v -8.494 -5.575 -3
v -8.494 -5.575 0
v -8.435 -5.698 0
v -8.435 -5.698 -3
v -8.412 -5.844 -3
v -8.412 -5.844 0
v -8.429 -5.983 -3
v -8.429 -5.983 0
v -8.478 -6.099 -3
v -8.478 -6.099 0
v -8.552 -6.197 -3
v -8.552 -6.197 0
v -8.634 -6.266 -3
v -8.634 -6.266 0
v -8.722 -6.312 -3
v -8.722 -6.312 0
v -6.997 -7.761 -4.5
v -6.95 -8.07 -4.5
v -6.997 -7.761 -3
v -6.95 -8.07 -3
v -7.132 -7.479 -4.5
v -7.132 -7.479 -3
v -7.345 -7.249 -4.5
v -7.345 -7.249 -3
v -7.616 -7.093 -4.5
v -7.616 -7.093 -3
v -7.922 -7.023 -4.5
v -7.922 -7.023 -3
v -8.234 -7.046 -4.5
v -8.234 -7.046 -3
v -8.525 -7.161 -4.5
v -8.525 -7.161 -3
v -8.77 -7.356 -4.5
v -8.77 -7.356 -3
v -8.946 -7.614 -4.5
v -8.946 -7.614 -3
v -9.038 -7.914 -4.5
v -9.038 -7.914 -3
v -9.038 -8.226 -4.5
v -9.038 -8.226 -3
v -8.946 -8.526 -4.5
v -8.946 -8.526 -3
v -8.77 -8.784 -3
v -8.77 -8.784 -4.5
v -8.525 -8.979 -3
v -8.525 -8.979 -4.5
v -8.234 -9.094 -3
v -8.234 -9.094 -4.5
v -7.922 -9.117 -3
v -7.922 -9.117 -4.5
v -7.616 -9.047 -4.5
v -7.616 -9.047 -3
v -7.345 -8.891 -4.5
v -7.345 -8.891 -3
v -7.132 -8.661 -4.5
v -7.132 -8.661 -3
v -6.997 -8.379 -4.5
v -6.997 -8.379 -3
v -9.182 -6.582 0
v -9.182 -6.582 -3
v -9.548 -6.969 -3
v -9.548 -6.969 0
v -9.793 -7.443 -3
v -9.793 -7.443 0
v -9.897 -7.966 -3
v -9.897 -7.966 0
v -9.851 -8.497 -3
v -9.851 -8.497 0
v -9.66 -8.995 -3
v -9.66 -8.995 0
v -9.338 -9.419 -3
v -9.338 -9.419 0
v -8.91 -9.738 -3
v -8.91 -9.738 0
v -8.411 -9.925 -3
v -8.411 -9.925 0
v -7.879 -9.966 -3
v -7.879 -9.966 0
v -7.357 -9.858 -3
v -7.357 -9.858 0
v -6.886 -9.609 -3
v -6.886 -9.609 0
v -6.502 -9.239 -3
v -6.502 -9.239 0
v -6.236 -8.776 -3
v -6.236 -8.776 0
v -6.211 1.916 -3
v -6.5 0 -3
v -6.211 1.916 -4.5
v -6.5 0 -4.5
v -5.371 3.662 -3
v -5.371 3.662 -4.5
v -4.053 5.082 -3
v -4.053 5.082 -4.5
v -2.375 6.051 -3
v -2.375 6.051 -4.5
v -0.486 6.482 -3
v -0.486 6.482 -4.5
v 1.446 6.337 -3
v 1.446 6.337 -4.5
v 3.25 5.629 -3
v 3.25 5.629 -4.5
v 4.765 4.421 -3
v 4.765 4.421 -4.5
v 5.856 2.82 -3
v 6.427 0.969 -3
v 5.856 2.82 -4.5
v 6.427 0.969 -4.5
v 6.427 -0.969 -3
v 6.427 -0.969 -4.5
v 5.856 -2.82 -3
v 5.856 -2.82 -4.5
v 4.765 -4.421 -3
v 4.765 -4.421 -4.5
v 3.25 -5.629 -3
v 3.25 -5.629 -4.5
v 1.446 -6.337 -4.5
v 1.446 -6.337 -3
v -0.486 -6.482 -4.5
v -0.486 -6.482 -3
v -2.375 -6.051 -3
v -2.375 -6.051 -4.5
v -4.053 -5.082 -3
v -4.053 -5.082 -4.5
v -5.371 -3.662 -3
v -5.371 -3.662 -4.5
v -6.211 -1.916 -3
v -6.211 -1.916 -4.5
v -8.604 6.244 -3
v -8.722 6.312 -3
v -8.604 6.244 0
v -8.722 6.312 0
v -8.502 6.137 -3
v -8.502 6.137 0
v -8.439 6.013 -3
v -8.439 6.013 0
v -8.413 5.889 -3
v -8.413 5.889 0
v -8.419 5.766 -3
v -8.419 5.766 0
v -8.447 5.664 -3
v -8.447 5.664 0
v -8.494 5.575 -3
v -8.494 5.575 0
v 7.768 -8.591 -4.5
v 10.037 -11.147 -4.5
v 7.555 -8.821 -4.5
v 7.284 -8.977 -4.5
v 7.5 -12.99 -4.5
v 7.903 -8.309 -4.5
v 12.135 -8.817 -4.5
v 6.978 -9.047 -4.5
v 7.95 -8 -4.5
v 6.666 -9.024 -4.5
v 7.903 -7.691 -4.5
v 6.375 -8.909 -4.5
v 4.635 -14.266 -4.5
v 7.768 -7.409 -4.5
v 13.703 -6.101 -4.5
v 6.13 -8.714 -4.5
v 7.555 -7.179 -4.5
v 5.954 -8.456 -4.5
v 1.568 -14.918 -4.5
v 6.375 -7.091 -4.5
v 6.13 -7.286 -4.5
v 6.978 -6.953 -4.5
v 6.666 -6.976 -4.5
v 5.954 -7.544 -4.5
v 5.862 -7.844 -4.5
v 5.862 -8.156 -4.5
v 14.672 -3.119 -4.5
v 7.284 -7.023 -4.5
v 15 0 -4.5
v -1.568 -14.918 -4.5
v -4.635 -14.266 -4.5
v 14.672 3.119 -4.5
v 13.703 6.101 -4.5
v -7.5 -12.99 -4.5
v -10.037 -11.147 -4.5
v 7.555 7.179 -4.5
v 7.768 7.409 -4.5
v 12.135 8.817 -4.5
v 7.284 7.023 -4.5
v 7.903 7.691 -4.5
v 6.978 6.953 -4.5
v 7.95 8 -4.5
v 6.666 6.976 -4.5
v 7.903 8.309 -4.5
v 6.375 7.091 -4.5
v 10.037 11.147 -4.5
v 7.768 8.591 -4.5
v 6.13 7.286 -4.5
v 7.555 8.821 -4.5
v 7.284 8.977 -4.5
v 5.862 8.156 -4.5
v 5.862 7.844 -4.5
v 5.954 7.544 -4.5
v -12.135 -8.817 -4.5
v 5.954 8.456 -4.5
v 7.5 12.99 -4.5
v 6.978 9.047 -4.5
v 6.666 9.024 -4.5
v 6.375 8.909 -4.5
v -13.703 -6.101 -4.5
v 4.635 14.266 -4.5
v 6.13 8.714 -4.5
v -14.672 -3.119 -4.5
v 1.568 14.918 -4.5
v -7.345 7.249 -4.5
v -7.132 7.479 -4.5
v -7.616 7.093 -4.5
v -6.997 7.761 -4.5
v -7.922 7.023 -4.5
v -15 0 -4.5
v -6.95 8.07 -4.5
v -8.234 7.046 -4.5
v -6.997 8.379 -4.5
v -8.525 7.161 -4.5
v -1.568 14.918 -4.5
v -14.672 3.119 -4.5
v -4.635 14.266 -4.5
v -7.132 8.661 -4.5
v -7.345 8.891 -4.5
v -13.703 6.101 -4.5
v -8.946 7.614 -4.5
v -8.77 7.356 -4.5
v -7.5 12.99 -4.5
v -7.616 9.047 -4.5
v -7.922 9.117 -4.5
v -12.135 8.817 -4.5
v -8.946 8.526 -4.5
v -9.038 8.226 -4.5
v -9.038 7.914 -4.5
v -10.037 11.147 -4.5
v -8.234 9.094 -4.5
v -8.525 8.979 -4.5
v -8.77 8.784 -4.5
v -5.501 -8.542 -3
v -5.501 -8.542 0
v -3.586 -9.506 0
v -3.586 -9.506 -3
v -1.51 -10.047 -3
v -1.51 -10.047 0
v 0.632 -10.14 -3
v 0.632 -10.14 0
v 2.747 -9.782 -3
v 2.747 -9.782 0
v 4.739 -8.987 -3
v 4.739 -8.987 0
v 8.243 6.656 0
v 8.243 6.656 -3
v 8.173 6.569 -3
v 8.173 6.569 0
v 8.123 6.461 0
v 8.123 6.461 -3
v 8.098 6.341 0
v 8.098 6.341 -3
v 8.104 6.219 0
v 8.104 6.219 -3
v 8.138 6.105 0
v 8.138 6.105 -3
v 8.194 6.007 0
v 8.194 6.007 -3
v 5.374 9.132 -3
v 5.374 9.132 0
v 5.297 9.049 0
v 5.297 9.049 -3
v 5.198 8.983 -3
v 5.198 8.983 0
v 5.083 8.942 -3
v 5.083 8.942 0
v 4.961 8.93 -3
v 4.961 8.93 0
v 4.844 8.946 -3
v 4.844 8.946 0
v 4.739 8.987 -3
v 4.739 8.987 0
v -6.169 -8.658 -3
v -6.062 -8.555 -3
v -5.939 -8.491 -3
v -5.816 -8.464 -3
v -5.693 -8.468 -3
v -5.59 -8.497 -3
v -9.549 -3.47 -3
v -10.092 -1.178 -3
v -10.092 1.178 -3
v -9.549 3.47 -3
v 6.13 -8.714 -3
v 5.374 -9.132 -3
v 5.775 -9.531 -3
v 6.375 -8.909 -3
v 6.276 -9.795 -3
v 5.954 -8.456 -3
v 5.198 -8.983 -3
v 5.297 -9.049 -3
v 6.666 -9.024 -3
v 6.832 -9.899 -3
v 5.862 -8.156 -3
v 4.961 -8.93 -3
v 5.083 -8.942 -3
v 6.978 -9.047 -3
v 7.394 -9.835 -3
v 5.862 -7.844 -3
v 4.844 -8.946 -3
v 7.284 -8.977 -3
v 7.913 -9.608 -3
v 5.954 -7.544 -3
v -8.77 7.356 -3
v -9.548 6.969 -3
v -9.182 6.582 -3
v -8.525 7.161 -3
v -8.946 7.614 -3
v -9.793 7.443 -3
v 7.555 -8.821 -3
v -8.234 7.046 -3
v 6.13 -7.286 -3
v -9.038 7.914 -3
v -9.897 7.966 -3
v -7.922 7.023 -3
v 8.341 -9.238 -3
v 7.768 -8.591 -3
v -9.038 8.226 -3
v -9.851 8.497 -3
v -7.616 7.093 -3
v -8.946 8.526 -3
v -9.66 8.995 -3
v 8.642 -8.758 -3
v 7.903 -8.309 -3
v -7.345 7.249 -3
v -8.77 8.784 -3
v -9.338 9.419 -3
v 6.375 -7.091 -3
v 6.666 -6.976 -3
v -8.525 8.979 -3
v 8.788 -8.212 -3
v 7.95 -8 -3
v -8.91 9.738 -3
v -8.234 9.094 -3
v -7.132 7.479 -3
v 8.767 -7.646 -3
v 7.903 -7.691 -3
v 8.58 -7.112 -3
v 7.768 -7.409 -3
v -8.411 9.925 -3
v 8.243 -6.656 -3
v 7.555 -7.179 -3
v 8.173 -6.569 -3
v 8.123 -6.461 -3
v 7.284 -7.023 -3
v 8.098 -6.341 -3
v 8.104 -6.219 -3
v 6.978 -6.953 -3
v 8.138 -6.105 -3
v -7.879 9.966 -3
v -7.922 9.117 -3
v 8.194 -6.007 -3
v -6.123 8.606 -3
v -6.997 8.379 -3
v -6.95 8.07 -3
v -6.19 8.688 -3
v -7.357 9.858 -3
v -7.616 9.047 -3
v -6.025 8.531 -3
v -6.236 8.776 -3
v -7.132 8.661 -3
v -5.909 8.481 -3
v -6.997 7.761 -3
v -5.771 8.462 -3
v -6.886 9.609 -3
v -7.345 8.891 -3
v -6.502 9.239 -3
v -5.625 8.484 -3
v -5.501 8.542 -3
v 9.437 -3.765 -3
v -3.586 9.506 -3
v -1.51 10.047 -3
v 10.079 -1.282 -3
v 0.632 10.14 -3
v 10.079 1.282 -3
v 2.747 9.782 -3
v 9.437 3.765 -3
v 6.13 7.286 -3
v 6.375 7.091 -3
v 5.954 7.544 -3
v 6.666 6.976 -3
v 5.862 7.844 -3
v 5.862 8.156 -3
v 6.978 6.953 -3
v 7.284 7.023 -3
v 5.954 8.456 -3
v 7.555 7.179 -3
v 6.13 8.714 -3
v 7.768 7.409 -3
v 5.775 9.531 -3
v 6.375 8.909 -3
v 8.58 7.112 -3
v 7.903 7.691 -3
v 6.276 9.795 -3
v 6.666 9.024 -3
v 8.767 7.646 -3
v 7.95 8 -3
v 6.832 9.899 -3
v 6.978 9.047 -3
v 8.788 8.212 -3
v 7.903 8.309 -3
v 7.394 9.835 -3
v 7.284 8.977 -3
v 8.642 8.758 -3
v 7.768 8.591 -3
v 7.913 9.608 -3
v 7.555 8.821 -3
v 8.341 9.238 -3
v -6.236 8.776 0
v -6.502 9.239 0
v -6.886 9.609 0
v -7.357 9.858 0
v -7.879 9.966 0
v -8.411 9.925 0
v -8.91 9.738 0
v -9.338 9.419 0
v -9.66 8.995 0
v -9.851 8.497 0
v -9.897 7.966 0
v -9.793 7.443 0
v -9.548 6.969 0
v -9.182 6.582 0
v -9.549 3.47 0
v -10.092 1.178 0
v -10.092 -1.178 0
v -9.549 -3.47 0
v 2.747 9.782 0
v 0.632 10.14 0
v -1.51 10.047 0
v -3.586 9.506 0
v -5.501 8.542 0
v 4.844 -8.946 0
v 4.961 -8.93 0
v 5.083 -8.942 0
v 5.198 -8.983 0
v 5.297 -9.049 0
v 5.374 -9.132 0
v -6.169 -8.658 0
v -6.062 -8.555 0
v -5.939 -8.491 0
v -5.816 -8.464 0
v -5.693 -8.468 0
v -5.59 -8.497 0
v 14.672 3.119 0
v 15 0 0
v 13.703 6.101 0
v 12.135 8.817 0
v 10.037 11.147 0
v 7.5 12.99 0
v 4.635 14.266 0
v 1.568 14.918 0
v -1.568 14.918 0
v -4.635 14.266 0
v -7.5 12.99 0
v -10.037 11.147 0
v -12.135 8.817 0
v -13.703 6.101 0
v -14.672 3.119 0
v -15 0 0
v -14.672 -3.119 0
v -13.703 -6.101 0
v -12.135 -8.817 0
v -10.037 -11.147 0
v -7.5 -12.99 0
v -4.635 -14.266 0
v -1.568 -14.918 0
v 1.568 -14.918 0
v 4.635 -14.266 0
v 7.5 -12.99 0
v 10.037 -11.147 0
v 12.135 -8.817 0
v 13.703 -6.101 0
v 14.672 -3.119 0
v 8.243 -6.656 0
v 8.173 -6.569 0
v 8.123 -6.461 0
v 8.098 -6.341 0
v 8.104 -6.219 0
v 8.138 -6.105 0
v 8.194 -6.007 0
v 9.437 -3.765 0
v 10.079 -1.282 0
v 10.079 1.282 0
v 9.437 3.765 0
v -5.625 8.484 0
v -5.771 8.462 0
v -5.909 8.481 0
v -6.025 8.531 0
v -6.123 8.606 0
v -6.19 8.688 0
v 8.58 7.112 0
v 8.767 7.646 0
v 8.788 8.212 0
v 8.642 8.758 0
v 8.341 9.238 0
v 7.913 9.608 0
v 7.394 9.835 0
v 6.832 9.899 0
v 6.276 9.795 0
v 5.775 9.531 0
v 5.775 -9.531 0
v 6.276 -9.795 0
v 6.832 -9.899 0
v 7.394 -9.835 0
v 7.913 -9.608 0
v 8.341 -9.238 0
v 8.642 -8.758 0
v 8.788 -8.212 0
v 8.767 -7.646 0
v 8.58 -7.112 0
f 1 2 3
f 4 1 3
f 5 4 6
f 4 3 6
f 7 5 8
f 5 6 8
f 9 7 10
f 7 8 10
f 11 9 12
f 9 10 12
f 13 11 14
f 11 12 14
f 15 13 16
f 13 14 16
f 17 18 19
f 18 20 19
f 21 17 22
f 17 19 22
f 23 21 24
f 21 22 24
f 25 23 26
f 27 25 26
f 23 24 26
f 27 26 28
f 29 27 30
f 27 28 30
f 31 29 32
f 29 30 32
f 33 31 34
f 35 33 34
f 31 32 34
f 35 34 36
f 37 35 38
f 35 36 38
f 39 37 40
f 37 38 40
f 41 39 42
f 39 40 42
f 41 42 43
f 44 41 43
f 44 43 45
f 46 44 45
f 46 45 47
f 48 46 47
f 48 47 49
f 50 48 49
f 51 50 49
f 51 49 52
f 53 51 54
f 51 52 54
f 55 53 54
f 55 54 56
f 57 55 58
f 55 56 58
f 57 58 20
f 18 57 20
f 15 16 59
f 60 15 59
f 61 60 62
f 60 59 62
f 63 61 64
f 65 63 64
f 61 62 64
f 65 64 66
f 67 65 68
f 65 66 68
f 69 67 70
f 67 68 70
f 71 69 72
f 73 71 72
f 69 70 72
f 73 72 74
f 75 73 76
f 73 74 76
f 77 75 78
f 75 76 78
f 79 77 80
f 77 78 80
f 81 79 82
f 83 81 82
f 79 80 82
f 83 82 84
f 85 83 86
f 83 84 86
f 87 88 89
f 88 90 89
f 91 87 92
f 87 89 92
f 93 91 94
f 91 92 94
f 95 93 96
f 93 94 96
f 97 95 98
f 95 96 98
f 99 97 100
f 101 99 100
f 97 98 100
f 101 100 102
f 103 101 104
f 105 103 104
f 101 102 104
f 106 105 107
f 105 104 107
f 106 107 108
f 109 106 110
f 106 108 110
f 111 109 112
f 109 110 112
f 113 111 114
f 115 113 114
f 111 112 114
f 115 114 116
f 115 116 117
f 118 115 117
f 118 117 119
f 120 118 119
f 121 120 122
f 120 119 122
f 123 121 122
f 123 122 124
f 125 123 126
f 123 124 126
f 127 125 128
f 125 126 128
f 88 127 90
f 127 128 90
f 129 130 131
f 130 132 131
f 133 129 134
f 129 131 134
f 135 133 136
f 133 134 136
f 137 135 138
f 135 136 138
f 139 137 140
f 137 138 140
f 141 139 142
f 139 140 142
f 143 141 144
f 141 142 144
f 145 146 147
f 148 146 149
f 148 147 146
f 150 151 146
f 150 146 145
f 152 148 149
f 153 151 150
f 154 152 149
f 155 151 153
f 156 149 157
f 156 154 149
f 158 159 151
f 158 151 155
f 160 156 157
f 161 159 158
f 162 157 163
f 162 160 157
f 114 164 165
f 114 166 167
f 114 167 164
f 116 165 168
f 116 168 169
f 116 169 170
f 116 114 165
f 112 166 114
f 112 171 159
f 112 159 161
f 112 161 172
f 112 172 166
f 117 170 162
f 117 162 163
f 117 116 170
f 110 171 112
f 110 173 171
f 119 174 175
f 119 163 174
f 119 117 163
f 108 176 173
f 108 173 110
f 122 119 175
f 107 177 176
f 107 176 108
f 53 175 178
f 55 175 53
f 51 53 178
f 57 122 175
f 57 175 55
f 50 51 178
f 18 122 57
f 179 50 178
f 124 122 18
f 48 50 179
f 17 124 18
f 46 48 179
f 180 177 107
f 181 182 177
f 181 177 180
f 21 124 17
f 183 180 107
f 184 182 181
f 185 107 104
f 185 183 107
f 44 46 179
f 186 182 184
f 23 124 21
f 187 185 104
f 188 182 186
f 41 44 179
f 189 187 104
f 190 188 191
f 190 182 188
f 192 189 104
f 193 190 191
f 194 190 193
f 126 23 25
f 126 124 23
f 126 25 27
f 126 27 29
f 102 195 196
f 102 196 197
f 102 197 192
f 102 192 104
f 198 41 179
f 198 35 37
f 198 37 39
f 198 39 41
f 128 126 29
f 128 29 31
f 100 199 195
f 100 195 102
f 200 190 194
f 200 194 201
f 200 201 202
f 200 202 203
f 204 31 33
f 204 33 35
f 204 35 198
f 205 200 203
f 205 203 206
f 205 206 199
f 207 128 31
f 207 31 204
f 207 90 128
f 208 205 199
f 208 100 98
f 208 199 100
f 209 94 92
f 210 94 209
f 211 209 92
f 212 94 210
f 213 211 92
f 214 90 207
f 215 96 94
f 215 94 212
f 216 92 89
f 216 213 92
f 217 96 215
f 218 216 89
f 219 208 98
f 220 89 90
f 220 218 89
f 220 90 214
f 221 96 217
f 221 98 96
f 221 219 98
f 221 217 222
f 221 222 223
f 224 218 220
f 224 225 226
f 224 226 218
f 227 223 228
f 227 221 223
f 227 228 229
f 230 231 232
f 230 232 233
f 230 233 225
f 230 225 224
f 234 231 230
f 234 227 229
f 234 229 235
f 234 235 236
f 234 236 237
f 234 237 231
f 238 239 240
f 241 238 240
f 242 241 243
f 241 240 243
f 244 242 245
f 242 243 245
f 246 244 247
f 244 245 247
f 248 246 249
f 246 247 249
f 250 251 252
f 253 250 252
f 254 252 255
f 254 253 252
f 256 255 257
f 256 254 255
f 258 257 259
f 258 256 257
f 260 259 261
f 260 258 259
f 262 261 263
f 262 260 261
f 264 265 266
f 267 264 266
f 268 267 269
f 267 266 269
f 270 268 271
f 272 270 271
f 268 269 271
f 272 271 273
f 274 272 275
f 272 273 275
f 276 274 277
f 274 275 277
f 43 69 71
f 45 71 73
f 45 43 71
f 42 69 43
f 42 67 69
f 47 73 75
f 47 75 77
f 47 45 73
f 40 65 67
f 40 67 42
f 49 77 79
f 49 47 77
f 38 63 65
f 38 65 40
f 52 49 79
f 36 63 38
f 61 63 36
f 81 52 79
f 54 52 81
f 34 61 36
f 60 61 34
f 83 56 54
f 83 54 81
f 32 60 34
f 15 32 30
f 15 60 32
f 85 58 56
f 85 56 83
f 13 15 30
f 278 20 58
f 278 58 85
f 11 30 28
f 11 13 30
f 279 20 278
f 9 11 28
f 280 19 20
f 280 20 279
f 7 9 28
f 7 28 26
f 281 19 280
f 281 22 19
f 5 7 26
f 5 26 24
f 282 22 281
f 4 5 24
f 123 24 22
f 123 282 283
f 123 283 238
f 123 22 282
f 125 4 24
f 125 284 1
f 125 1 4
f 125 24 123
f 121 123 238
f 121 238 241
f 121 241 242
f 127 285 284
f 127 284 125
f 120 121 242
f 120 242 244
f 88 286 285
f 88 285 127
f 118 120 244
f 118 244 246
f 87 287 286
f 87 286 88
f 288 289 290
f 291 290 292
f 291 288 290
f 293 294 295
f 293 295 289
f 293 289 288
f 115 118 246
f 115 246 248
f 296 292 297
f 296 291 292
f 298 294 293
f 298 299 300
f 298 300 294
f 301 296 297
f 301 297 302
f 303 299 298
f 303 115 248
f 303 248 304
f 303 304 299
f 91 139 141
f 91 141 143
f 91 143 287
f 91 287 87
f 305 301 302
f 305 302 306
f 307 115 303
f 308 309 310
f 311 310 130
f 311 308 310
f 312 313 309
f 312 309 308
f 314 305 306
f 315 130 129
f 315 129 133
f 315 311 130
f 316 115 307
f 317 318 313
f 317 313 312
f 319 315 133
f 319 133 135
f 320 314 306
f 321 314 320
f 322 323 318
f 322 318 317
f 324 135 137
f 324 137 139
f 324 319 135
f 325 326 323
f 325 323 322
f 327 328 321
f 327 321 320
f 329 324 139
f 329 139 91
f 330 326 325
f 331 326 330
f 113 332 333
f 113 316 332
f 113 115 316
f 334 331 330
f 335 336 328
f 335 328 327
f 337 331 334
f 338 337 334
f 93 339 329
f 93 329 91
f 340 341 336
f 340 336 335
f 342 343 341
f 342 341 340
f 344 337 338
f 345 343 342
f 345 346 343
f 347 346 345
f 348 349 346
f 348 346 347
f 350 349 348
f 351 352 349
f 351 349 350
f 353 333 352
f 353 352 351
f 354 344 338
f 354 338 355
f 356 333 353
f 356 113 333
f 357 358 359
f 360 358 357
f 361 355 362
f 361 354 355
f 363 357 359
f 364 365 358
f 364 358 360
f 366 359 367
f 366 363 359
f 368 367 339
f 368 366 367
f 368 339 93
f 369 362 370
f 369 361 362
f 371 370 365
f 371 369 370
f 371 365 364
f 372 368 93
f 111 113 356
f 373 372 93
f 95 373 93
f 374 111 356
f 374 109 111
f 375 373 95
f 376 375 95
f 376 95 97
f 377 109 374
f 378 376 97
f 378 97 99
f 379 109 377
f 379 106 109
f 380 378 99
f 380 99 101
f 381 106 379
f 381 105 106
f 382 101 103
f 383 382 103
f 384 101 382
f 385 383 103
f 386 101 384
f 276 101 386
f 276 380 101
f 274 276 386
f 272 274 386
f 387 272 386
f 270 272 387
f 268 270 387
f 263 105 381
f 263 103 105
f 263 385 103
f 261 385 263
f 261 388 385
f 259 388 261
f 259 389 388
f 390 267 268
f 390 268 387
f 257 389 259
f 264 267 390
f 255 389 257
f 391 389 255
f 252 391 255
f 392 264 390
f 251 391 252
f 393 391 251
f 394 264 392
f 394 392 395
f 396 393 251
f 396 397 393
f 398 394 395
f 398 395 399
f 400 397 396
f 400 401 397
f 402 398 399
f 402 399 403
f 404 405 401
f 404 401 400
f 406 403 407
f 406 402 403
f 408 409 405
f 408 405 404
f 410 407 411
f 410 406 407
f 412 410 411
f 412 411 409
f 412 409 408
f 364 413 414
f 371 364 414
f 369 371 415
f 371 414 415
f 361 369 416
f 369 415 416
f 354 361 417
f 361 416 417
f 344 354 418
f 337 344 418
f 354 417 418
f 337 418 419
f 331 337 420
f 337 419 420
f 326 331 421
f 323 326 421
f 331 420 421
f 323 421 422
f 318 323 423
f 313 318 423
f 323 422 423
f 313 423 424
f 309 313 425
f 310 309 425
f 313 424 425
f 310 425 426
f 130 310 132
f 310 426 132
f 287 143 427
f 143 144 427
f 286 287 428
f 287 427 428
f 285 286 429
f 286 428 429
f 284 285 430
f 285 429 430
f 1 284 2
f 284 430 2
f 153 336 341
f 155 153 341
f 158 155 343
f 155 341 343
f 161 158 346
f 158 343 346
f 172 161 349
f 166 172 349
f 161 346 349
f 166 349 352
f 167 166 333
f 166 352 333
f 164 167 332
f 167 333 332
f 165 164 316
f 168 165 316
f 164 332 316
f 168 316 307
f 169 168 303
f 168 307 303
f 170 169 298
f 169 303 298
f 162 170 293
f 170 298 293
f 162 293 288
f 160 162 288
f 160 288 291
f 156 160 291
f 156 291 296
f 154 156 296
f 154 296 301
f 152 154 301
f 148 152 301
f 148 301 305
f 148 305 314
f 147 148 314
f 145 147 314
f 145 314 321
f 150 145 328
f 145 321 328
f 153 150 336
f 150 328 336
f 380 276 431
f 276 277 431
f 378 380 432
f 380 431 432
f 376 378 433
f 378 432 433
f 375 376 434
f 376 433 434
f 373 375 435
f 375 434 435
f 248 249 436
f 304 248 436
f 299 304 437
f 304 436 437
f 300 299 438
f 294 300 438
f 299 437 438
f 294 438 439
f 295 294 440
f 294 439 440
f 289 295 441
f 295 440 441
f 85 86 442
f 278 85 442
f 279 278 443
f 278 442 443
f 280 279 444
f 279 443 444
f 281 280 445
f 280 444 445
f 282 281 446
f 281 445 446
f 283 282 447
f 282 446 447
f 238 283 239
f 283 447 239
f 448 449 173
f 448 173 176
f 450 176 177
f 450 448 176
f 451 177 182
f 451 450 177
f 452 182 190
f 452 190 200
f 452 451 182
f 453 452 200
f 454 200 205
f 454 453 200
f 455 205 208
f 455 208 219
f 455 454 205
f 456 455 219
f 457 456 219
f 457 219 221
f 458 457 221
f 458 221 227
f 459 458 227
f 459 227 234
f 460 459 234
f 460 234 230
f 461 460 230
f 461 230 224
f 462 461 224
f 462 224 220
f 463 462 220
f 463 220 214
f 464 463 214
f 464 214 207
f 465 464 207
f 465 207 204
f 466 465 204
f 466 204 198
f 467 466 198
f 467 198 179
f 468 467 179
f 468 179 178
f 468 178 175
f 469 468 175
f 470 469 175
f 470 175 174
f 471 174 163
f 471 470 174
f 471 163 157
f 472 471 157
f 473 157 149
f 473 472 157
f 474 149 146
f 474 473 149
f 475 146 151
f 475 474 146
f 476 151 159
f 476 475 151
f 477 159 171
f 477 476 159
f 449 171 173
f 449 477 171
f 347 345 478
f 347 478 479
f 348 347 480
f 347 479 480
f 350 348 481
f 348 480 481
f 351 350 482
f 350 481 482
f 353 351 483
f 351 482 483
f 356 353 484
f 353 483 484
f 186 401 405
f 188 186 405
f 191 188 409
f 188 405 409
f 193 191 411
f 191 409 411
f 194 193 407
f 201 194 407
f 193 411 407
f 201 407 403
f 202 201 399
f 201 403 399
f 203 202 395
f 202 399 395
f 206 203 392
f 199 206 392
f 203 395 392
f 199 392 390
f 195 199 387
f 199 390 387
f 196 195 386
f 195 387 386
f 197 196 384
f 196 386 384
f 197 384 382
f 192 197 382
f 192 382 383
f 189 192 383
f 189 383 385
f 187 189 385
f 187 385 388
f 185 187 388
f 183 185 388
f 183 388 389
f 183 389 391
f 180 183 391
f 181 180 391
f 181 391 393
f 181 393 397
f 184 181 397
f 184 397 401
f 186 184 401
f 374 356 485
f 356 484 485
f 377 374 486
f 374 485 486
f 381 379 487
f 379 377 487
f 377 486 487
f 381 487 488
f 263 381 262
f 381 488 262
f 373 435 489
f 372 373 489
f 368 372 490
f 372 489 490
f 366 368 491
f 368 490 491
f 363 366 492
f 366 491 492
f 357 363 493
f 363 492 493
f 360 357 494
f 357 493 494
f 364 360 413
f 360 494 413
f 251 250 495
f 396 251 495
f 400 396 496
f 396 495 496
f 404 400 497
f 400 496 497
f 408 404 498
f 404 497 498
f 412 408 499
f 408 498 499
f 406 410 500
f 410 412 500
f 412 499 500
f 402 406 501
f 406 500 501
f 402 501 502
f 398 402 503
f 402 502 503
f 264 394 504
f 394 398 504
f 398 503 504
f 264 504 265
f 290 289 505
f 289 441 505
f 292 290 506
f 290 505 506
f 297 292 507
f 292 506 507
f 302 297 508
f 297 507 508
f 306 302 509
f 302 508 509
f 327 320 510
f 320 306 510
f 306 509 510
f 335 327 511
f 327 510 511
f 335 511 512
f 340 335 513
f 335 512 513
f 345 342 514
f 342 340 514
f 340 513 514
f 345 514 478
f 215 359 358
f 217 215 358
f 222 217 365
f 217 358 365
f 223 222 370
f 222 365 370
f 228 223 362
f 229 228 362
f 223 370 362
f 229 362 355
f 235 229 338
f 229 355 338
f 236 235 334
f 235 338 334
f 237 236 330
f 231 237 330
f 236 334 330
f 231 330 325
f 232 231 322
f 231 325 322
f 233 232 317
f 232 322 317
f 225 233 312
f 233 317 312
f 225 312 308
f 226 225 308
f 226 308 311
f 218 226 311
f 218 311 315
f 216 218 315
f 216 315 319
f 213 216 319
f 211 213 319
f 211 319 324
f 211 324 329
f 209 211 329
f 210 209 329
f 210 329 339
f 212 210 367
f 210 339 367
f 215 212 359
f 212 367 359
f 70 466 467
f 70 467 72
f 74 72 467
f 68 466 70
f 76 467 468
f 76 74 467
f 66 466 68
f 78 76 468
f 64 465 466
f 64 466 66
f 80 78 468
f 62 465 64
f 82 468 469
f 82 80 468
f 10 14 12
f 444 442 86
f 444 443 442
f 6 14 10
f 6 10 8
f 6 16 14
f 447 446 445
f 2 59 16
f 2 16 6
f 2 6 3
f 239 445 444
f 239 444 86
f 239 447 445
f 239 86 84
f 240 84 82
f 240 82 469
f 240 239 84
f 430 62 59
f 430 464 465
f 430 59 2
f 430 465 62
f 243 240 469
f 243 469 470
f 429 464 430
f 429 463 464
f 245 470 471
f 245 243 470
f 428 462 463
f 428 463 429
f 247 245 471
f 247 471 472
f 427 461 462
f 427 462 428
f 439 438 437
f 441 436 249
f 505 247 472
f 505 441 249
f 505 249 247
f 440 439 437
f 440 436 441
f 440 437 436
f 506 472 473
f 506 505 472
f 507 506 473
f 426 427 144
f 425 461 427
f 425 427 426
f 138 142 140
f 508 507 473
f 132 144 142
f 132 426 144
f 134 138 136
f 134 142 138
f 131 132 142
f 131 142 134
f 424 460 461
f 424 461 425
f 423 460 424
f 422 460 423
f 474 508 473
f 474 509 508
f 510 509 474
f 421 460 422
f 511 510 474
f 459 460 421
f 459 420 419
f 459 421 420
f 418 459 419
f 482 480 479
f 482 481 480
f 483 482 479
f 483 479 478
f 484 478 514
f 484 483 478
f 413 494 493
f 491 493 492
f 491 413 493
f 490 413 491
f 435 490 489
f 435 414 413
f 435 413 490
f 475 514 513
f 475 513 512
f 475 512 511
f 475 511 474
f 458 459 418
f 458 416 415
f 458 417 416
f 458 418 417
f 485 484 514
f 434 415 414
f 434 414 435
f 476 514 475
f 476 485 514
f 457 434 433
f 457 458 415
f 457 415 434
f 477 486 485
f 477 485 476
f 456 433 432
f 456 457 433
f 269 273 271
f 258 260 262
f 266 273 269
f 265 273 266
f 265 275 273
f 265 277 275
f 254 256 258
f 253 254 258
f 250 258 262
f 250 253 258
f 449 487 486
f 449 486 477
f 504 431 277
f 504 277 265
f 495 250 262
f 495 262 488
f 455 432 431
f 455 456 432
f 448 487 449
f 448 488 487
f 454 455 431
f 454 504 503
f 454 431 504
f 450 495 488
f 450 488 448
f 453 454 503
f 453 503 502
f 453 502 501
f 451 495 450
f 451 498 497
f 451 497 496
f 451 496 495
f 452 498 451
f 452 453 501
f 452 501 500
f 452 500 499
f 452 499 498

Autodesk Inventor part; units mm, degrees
ref_plane "YZ Plane" through (0, 0, 0) normal (1, 0, 0) x (0, 1, 0)
ref_plane "XZ Plane" through (0, 0, 0) normal (0, 1, 0) x (-1, 0, 0)
ref_plane "XY Plane" through (0, 0, 0) normal (0, 0, 1) x (1, 0, 0)
sketch "Sketch8" plane through (0, 0, 0) normal (0, 0, 1) x (1, 0, 0)
  circle A0 centre (0, 0) radius 15
  dimension "d33" = 30
extrude "Extrusion7" add sketch "Sketch8" against normal blind 8
sketch "Sketch10" plane through (0, 0, -8) normal (0, 0, -1) x (-1, 0, 0)
  line L0 (9, 10.07) -> (-29.1, 10.07)
  arc A0 (10, 9.07) -> (9, 10.07) centre (9, 9.07) ccw
  line L1 (10, 9.07) -> (10, -9.07)
  arc A1 (9, -10.07) -> (10, -9.07) centre (9, -9.07) ccw
  line L2 (-29.1, -10.07) -> (9, -10.07)
  line L3 (-29.1, 10.07) -> (-29.1, -10.07)
  line L4 (10.4, -9.07) -> (10.4, 9.07)
  arc A2 (10.4, 9.07) -> (9, 10.47) centre (9, 9.07) ccw
  line L5 (9, 10.47) -> (-29.5, 10.47)
  line L6 (-29.5, 10.47) -> (-29.5, -10.47)
  line L7 (-29.5, -10.47) -> (9, -10.47)
  arc A3 (9, -10.47) -> (10.4, -9.07) centre (9, -9.07) ccw
  dimension "d59" = 0.4
extrude "Extrusion8" cut sketch "Sketch10" against normal blind 2 contours A0 L1 A1 L2 L3 L0 | A3 L7 L6 L5 A2 L4
sketch "Sketch11" plane through (0, 0, -6) normal (0, 0, -1) x (-1, 0, 0)
  circle A0 centre (0, 0) radius 6.4
  circle A1 centre (0, 0) radius 6.5
  point P0 (0, 0)
  dimension "d58" = 13
extrude "Extrusion9" cut sketch "Sketch11" against normal through all contours A0 | A1
sketch "Sketch13" plane through (0, 0, 0) normal (0, 0, 1) x (1, 0, 0)
  circle A0 centre (0, 0) radius 9.96
  circle A1 centre (0, 0) radius 10.16
  point P0 (0, 0)
  dimension "d44" = 0.2
extrude "Extrusion11" cut sketch "Sketch13" against normal blind 3 contours A0 | A1
sketch "Sketch14" plane through (0, 0, 0) normal (0, 0, 1) x (1, 0, 0)
  circle A0 centre (6.9, 8) radius 0.7835
  circle A1 centre (6.9, -8) radius 0.7835
  circle A2 centre (-8, 8.07) radius 1
  circle A3 centre (-8, -8.07) radius 1
  point P0 (0, 0)
hole "Hole2" at (6.9, 8, 0) at (-8, 8.07, 0) at (-8, -8.07, 0) at (6.9, -8, 0) direction (0, 0, -1) diameter 2.1 end through all
sketch "Sketch15" plane through (0, 0, 0) normal (0, 0, 1) x (1, 0, 0)
  arc A0 (7.3255, 7.0401) -> (5.888, 8.2799) centre (6.9, 8) ccw projected
  arc A1 (5.888, -8.2799) -> (7.3255, -7.0401) centre (6.9, -8) ccw projected
  circle A2 centre (-8, 8.07) radius 1.05 projected
  circle A3 centre (-8, -8.07) radius 1.05 projected
  circle A4 centre (6.9, 8) radius 1.9
  circle A5 centre (6.9, -8) radius 1.9
  circle A6 centre (-8, -8.07) radius 1.9
  circle A7 centre (-8, 8.07) radius 1.9
  point P0 (0, 0)
  dimension "d54" = 3.8
extrude "Extrusion12" cut sketch "Sketch15" against normal blind 4.5 contours A2 | A3 | A4 | A5 | A6 | A7
fillet "Fillet2" radius 0.5 8 edges at (5.1562, 8.7544, -1.5) (7.9023, 6.3859, -1.5) (-6.1008, 8.1244, -1.5) (-8.071, 6.1713, -1.5) (-8.071, -6.1713, -1.5) (-6.1008, -8.1244, -1.5) (5.1562, -8.7544, -1.5) (7.9023, -6.3859, -1.5)
sketch "Sketch16" plane through (0, 0, -8) normal (0, 0, -1) x (-1, 0, 0)
  circle A0 centre (-6.9, -8) radius 1.05 projected
  circle A1 centre (8, -8.07) radius 1.05 projected
  circle A2 centre (8, 8.07) radius 1.05 projected
  circle A3 centre (-6.9, 8) radius 1.05 projected
  circle A4 centre (0, 0) radius 6.5 projected
  arc A5 (-10.7415, 10.47) -> (-10.7415, -10.47) centre (0, 0) ccw projected
  line L0 (9, -10.47) -> (-10.7415, -10.47) projected
  arc A6 (9, -10.47) -> (10.4, -9.07) centre (9, -9.07) ccw projected
  line L1 (10.4, 9.07) -> (10.4, -9.07) projected
  arc A7 (10.4, 9.07) -> (9, 10.47) centre (9, 9.07) ccw projected
  line L2 (-10.7415, 10.47) -> (9, 10.47) projected
  line L3 (-10.7415, 10.47) -> (9, 10.47) projected
  arc A8 (10.4, 9.07) -> (9, 10.47) centre (9, 9.07) ccw projected
  line L4 (10.4, 9.07) -> (10.4, -9.07) projected
  arc A9 (9, -10.47) -> (10.4, -9.07) centre (9, -9.07) ccw projected
  line L5 (9, -10.47) -> (-10.7415, -10.47) projected
  arc A10 (-10.7415, -10.47) -> (-10.7415, 10.47) centre (0, 0) ccw projected
sketch "Sketch17" plane through (0, 0, -3) normal (0, 0, 1) x (1, 0, 0)
  circle A0 centre (6.9, 8) radius 1.05 projected
  circle A1 centre (6.9, 8) radius 1.9 projected
  circle A2 centre (6.9, -8) radius 1.05 projected
  circle A3 centre (6.9, -8) radius 1.9 projected
  circle A4 centre (-8, 8.07) radius 1.05 projected
  circle A5 centre (-8, 8.07) radius 1.9 projected
  circle A6 centre (-8, -8.07) radius 1.05 projected
  circle A7 centre (-8, -8.07) radius 1.9 projected
  point P0 (0, 0)
extrude "Extrusion13" add sketch "Sketch17" against normal blind 1.5
extrude "Extrusion14" cut sketch "Sketch16" against normal blind 3.5
properties part number "frame_motor_support_top" material "Aluminum 6061-AHC"
